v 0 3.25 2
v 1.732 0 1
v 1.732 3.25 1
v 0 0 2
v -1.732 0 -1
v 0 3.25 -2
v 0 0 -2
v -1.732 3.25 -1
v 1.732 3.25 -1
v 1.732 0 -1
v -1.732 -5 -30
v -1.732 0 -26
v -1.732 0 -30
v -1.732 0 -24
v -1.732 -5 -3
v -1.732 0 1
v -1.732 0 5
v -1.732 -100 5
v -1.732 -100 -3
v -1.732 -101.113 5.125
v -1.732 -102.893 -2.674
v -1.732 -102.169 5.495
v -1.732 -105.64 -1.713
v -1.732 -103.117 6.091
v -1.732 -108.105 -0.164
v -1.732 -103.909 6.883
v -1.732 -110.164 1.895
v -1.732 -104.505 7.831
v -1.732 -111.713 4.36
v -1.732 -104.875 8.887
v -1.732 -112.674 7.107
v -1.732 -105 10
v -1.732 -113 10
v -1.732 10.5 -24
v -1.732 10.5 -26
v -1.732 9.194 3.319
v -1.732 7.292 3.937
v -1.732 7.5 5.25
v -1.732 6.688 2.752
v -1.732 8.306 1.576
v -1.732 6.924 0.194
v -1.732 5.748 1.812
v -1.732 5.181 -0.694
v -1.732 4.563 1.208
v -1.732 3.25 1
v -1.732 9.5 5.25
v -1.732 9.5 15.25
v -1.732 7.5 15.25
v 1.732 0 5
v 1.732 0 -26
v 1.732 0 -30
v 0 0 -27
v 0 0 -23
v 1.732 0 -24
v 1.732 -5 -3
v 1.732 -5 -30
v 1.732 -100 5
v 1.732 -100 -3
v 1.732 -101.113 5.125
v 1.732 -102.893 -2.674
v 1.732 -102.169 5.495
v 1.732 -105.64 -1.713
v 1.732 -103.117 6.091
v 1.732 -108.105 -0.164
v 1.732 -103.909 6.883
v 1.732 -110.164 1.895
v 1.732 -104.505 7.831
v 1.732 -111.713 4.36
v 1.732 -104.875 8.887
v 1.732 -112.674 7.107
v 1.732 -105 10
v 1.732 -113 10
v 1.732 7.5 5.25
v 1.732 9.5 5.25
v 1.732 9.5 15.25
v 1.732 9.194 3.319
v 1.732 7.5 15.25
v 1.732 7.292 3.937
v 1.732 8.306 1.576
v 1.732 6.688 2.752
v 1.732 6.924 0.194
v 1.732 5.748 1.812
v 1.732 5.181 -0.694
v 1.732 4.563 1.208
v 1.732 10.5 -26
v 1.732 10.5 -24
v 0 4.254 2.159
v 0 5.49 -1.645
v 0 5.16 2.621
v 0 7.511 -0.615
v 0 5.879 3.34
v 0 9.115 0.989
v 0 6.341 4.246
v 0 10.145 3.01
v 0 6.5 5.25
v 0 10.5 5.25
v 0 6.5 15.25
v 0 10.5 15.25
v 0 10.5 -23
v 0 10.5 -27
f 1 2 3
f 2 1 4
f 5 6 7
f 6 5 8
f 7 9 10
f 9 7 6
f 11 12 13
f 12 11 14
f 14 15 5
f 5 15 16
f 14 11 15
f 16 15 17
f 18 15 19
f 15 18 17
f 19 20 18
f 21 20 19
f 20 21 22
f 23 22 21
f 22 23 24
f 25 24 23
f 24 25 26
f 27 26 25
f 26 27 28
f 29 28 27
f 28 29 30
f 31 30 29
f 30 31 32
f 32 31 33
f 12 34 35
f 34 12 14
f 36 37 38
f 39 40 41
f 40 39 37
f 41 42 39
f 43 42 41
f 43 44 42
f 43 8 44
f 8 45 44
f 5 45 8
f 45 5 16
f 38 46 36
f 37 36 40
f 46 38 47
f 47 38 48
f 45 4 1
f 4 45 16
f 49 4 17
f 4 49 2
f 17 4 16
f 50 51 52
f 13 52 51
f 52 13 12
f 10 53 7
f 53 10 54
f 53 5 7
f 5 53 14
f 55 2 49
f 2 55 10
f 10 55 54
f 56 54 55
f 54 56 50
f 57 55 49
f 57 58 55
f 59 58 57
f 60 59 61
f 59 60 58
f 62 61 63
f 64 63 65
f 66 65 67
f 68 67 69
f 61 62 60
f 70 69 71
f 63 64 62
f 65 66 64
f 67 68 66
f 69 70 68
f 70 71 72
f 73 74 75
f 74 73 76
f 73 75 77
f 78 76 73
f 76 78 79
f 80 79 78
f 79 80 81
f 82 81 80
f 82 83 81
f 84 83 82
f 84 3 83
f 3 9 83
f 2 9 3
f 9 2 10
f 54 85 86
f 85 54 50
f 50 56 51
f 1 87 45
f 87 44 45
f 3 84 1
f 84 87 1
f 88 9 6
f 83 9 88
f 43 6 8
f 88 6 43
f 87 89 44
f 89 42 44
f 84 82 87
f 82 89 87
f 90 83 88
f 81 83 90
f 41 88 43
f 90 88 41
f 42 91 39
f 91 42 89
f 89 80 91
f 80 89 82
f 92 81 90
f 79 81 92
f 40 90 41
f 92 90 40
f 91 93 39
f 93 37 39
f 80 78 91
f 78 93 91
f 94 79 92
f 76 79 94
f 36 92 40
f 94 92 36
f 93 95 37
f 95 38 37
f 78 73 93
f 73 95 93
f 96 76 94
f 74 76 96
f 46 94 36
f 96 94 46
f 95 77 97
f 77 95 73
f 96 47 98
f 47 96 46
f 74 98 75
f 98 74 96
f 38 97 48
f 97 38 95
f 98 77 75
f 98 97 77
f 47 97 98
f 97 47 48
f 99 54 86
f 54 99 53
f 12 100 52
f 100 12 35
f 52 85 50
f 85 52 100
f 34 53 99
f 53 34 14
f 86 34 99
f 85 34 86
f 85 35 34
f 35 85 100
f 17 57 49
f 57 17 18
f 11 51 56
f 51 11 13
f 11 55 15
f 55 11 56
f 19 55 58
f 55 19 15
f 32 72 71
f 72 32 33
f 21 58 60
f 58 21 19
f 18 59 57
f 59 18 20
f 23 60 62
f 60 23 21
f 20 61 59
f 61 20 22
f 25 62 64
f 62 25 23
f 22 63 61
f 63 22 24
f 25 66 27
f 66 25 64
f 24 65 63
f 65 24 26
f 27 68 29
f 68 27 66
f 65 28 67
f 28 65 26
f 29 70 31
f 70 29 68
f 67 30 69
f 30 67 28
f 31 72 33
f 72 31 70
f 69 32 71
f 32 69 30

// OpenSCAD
I = 25;
R = 2;
W = R * sqrt(3) / 2;
thick = 6.5;

rotate([-90, 30, 0])
    cylinder(r = R, h = thick / 2, $fn = 6);
translate([0, thick / 2, thick / 2 + R])
    rotate([0, 90, 0])
        rotate_extrude(angle = 90)
            translate([thick / 2 + R, 0])
                circle(r = R, $fn = 6);
translate([0, thick + R, thick / 2 + R])
    rotate([0, 0, 30])
        cylinder(r = R, h = 10, $fn = 6);

translate([0, 0, -I])
    rotate([-90, 30, 0])
        cylinder(r = R, h = thick + R * 2, $fn = 6);

translate([-W, -5, -I - 5])
    cube([W * 2, 5, I + 10]);

translate([-W, -100, -3])
    cube([W * 2, 100, 8]);
translate([W, -100, 10])
    rotate([180, 90, 0])
        rotate_extrude(angle = 90)
            translate([5, 0])
                square([8, W * 2]);
